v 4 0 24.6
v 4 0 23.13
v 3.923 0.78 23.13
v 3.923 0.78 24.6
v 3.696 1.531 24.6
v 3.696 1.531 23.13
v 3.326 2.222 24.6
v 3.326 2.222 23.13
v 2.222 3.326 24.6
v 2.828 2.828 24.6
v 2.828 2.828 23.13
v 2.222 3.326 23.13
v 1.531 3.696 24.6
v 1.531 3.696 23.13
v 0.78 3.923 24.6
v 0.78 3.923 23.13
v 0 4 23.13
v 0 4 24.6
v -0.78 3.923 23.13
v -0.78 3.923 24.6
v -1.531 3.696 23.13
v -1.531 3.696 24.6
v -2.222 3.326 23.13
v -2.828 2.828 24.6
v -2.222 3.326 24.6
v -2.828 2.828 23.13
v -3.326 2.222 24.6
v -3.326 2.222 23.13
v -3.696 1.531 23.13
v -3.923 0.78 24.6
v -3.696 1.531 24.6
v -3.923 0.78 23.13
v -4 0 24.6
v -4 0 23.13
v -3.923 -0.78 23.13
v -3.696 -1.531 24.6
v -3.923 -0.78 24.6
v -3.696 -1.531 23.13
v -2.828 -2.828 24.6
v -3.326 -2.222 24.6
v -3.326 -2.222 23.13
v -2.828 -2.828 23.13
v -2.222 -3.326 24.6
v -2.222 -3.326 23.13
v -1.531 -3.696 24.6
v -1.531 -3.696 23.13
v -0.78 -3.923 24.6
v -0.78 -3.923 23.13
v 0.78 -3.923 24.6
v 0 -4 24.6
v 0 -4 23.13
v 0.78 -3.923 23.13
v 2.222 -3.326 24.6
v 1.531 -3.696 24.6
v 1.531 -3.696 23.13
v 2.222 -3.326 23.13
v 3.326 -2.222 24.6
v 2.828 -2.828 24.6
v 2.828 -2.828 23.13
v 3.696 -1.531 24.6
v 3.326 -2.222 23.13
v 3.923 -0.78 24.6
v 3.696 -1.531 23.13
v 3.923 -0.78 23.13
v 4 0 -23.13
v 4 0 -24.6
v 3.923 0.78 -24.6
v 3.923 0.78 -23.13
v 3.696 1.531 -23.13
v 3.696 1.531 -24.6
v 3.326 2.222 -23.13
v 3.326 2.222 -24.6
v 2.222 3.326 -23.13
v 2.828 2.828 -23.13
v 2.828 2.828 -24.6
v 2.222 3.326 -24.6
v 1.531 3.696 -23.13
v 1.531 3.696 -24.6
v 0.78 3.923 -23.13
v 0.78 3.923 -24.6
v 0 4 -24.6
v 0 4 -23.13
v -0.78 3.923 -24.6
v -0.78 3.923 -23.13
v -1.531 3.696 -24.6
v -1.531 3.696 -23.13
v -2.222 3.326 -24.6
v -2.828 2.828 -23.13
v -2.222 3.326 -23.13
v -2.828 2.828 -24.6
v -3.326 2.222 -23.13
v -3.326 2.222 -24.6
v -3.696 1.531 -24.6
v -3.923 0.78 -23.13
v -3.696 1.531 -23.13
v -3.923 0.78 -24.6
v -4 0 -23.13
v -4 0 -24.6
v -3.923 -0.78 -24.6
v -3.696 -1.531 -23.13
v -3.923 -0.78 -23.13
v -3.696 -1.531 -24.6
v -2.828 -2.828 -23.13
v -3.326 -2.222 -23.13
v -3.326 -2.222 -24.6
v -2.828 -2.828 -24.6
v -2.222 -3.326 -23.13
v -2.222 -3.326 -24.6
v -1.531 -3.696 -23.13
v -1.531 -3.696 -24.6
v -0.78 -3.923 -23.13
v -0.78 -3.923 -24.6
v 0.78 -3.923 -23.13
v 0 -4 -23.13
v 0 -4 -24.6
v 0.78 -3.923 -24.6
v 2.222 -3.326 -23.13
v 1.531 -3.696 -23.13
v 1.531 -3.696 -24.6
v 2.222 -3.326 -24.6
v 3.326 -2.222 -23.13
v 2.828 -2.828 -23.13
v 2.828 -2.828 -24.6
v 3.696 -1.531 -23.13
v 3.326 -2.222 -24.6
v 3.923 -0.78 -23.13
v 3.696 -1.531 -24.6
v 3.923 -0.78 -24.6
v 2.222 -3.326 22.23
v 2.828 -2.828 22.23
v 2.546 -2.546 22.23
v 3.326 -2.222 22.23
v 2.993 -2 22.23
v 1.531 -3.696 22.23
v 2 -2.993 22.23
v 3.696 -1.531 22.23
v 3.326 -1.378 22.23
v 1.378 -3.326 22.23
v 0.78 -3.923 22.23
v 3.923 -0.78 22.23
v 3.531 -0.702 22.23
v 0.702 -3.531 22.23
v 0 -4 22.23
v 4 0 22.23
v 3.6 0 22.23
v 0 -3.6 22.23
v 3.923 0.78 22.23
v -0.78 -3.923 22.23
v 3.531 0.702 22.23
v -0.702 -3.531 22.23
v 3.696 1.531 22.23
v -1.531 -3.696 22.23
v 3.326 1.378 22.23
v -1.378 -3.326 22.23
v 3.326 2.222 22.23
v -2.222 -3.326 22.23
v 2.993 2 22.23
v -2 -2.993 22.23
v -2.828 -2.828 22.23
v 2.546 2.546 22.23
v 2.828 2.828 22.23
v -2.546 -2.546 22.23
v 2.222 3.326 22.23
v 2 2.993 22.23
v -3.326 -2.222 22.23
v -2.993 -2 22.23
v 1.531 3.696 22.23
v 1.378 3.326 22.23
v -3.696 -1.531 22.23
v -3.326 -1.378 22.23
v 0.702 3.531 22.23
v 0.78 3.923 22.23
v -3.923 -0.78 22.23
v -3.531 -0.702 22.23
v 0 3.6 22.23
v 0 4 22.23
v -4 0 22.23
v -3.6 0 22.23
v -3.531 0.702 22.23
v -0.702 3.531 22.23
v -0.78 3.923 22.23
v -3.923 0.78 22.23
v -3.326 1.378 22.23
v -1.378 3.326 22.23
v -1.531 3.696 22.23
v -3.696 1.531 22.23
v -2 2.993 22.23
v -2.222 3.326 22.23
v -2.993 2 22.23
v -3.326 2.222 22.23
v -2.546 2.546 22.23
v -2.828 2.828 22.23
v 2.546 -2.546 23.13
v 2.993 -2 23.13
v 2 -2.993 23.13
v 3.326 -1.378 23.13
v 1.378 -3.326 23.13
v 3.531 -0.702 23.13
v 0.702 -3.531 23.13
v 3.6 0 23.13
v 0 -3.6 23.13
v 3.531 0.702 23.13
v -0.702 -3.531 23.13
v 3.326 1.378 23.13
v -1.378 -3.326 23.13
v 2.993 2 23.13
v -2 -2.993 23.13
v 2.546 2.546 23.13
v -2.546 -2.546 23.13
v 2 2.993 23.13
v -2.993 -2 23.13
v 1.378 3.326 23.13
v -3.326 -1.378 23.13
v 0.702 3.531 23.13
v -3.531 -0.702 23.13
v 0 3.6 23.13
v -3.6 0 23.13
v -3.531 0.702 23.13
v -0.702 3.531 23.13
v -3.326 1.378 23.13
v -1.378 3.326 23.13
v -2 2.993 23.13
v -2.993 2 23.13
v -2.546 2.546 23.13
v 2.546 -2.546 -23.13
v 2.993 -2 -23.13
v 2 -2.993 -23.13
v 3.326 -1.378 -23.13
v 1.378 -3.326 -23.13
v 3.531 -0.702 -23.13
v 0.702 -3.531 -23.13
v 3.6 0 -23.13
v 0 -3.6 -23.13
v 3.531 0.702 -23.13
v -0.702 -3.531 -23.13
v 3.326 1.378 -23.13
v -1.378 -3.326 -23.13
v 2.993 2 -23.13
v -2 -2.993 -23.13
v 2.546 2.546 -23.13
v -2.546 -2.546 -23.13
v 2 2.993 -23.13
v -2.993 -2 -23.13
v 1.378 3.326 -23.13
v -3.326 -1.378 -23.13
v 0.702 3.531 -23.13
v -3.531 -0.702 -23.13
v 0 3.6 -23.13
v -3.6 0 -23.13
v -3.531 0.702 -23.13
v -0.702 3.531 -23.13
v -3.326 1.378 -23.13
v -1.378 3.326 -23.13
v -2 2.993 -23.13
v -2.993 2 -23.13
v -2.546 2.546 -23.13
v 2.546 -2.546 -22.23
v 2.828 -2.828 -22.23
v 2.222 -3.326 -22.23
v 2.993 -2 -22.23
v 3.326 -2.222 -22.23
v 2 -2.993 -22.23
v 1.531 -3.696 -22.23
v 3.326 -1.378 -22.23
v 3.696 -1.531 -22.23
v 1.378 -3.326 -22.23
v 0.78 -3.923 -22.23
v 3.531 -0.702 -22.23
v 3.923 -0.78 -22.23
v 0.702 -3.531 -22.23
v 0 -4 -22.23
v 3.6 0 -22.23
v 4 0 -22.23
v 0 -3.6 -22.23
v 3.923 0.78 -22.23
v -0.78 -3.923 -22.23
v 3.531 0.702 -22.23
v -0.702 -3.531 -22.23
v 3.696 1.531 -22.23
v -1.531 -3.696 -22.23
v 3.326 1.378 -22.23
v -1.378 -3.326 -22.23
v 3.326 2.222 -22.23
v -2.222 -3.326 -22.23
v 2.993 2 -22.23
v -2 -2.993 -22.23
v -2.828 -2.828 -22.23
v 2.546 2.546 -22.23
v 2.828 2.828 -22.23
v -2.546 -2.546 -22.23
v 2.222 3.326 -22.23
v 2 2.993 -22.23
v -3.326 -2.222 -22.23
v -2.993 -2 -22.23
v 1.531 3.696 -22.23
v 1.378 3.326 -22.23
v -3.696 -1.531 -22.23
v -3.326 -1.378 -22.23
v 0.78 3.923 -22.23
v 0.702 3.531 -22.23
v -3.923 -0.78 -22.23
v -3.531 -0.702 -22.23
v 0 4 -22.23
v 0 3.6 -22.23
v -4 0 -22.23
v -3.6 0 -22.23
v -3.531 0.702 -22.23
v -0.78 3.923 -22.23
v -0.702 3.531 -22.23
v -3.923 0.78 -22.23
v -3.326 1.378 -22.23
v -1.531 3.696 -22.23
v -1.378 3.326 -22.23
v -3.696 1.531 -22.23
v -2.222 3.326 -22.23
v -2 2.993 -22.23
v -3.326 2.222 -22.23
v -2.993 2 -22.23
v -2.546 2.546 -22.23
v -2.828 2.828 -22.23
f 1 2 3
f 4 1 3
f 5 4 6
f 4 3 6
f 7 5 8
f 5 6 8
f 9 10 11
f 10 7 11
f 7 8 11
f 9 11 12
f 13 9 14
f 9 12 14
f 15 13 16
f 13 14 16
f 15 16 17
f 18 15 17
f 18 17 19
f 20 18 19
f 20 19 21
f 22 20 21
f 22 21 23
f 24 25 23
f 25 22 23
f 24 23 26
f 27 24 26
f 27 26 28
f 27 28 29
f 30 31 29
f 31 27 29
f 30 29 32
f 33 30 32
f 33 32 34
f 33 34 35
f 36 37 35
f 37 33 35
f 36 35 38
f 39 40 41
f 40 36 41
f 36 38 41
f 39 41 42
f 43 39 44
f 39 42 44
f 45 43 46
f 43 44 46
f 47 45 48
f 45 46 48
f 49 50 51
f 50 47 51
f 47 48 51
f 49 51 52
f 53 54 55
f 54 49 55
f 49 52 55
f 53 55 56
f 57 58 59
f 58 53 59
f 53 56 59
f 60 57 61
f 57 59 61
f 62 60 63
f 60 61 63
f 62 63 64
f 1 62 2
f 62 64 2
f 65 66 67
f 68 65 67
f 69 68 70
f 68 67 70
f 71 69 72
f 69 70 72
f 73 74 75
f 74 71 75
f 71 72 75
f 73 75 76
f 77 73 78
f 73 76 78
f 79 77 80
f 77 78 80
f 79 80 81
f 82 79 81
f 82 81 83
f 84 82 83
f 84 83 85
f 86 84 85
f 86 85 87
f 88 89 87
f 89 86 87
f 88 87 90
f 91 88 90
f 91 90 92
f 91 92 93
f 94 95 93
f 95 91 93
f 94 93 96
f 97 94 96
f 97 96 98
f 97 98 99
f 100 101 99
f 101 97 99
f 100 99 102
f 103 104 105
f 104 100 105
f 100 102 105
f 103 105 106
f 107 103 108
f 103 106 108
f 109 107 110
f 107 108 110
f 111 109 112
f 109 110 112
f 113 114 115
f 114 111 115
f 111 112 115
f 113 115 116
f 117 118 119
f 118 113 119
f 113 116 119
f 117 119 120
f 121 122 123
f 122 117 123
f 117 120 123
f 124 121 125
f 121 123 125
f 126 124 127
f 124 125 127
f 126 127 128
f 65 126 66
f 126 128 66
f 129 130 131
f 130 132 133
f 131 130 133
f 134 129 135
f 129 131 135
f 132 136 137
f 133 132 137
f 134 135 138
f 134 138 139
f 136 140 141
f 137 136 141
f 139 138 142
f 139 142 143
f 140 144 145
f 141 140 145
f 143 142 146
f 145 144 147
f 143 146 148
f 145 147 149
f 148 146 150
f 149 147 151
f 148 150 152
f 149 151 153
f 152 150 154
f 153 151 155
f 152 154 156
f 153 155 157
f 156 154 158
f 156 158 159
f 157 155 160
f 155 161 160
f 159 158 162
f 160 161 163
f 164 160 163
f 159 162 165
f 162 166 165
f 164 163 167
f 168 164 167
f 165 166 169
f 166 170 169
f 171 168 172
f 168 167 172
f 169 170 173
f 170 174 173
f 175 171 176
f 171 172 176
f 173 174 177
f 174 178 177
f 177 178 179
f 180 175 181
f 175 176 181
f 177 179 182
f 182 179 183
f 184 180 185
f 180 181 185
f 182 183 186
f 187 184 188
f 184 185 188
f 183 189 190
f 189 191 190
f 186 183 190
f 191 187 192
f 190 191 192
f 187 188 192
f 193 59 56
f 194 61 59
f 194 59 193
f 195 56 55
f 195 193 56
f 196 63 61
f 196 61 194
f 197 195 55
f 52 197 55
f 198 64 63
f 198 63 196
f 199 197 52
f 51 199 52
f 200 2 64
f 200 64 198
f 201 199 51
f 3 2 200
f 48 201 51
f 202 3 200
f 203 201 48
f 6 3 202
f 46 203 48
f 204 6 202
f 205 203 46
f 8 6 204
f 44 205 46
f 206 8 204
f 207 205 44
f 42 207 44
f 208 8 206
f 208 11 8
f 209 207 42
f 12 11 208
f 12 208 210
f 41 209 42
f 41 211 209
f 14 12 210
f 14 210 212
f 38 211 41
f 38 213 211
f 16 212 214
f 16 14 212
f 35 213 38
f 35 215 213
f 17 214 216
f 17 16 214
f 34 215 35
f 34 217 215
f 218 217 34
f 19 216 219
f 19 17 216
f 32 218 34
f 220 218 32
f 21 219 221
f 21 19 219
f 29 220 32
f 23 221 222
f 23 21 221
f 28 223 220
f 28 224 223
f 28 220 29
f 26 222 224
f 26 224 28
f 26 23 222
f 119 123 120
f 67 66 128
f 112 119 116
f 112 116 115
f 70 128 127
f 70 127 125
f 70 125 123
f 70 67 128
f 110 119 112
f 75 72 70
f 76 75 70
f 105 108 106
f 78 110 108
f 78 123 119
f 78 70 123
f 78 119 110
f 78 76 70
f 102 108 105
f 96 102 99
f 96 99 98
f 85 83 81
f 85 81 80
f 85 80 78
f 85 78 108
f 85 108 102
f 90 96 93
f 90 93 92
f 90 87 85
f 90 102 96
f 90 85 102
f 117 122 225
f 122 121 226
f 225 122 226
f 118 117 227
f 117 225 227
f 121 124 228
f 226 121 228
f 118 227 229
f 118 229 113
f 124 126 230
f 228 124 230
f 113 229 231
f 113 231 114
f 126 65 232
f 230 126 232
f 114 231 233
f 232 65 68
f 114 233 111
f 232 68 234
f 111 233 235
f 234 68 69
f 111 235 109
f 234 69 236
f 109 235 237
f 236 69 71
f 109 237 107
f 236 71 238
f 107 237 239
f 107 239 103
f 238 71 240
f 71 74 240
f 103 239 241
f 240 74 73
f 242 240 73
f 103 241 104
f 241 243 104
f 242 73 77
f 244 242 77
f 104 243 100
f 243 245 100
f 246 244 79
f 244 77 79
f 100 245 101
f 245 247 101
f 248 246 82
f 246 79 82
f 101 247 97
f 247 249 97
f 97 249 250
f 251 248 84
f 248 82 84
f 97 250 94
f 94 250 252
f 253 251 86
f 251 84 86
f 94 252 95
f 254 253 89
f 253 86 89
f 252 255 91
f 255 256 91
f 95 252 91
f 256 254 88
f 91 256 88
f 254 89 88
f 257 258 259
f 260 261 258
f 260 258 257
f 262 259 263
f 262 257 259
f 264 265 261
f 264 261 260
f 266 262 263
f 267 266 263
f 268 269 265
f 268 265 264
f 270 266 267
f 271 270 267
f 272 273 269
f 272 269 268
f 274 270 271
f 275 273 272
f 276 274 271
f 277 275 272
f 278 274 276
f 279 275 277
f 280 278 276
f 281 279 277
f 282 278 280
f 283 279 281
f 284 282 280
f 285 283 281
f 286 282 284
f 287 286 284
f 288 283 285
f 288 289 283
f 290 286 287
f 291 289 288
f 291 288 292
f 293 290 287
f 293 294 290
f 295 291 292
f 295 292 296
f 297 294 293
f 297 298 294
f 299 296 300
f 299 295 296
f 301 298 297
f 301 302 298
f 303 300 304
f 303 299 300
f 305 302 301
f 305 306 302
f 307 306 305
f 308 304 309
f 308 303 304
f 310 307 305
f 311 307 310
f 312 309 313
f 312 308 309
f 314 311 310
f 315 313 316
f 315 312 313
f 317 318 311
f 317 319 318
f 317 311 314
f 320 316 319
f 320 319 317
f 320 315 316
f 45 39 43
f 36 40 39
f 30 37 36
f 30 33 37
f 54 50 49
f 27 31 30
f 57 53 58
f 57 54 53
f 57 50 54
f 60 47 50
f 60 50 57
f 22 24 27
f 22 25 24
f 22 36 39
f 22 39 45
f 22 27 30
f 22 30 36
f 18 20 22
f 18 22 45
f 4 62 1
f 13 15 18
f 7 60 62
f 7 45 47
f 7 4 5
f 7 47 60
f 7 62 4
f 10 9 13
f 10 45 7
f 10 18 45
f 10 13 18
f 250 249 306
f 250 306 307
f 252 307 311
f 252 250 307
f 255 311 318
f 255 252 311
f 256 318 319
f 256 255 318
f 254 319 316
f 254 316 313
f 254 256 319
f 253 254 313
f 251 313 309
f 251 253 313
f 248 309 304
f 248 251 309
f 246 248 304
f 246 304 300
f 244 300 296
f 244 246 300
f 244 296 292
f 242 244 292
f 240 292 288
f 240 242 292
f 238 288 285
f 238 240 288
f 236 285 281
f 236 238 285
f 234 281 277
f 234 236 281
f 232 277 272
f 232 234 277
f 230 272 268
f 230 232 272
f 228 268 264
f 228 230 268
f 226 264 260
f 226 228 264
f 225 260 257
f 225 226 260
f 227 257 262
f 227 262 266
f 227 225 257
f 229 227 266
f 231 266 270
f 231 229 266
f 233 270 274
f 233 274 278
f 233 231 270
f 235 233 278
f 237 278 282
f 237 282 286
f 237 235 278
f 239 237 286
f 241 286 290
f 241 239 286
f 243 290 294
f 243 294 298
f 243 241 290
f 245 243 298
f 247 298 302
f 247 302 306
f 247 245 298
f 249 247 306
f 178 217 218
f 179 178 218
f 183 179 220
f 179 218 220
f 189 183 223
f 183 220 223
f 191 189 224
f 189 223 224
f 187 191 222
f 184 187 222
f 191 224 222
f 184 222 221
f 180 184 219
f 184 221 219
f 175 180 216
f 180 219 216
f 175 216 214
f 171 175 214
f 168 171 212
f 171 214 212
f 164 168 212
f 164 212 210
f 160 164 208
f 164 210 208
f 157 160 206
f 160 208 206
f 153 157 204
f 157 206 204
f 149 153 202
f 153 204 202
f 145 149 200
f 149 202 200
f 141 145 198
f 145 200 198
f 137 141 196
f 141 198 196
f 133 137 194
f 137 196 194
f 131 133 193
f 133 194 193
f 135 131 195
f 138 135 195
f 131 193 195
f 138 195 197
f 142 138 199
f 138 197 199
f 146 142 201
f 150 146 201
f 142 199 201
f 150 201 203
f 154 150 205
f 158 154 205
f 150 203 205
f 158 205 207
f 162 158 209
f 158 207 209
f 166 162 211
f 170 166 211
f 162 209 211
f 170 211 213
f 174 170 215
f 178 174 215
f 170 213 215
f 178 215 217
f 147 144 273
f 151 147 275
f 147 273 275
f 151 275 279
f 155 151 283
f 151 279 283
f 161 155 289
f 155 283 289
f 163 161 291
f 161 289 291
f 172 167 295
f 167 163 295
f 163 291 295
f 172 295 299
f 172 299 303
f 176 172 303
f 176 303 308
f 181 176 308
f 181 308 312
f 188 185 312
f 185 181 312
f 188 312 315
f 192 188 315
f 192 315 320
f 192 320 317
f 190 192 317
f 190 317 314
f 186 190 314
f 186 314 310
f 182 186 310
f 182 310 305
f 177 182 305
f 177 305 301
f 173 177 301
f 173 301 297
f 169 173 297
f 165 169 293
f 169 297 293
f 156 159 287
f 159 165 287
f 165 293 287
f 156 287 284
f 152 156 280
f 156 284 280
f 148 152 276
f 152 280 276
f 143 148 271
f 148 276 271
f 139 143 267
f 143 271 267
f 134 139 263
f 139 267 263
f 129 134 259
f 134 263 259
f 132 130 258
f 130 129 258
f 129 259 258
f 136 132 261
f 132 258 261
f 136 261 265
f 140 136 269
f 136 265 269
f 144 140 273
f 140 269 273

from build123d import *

# Parameters (mm, degrees)
BOSS_EXTRUDE1_DEPTH      = 50
BOSS_EXTRUDE1_DEPTH_BACK = 50
SKETCH3_R                = 4
CHAMFER1_SIZE            = 0.56
SKETCH4_R                = 8.463045105
CUT_EXTRUDE1_DEPTH       = 25.4
SKETCH5_R                = 6.629814771
CUT_EXTRUDE2_DEPTH       = 25.4
CUT_EXTRUDE3_START       = -1.47
SKETCH6_R                = 4
SKETCH6_R_2              = 3.6
CUT_EXTRUDE3_DEPTH       = 0.9


with BuildPart() as part:
    # Sketch3 → Boss-Extrude1 (new, two sides: drawn at the far end of the back side and taken through both)
    with BuildSketch(Plane.XY.offset(-BOSS_EXTRUDE1_DEPTH_BACK)):
        Circle(SKETCH3_R)
    extrude(amount=BOSS_EXTRUDE1_DEPTH + BOSS_EXTRUDE1_DEPTH_BACK)

    # Chamfer1
    chamfer1_edges = [part.edges().sort_by_distance(p)[0] for p in [
        (-4, 0, -50),
        (-4, 0, 50),
    ]]
    chamfer(chamfer1_edges, length=CHAMFER1_SIZE)

    # Sketch4 → Cut-Extrude1 (cut)
    with BuildSketch(Plane.XY.offset(50)):
        Circle(SKETCH4_R)
    extrude(amount=-CUT_EXTRUDE1_DEPTH, mode=Mode.SUBTRACT)

    # Sketch5 → Cut-Extrude2 (cut)
    with BuildSketch(Plane(origin=(0, 0, -50), x_dir=(-1, 0, 0), z_dir=(0, 0, -1))):
        Circle(SKETCH5_R)
    extrude(amount=-CUT_EXTRUDE2_DEPTH, mode=Mode.SUBTRACT)

    # Sketch6 → Cut-Extrude3 (cut)
    with BuildSketch(Plane(origin=(0, 0, -24.6), x_dir=(-1, 0, 0), z_dir=(0, 0, -1)).offset(CUT_EXTRUDE3_START)):
        Circle(SKETCH6_R)
        Circle(SKETCH6_R_2, mode=Mode.SUBTRACT)
    cut_extrude3 = extrude(amount=-CUT_EXTRUDE3_DEPTH, mode=Mode.SUBTRACT)

    # Mirror1: Cut-Extrude3 across plane
    add(cut_extrude3.mirror(Plane(origin=(0, 0, 0), x_dir=(1, 0, 0), z_dir=(0, 0, -1))), mode=Mode.SUBTRACT)


solid = part.part
